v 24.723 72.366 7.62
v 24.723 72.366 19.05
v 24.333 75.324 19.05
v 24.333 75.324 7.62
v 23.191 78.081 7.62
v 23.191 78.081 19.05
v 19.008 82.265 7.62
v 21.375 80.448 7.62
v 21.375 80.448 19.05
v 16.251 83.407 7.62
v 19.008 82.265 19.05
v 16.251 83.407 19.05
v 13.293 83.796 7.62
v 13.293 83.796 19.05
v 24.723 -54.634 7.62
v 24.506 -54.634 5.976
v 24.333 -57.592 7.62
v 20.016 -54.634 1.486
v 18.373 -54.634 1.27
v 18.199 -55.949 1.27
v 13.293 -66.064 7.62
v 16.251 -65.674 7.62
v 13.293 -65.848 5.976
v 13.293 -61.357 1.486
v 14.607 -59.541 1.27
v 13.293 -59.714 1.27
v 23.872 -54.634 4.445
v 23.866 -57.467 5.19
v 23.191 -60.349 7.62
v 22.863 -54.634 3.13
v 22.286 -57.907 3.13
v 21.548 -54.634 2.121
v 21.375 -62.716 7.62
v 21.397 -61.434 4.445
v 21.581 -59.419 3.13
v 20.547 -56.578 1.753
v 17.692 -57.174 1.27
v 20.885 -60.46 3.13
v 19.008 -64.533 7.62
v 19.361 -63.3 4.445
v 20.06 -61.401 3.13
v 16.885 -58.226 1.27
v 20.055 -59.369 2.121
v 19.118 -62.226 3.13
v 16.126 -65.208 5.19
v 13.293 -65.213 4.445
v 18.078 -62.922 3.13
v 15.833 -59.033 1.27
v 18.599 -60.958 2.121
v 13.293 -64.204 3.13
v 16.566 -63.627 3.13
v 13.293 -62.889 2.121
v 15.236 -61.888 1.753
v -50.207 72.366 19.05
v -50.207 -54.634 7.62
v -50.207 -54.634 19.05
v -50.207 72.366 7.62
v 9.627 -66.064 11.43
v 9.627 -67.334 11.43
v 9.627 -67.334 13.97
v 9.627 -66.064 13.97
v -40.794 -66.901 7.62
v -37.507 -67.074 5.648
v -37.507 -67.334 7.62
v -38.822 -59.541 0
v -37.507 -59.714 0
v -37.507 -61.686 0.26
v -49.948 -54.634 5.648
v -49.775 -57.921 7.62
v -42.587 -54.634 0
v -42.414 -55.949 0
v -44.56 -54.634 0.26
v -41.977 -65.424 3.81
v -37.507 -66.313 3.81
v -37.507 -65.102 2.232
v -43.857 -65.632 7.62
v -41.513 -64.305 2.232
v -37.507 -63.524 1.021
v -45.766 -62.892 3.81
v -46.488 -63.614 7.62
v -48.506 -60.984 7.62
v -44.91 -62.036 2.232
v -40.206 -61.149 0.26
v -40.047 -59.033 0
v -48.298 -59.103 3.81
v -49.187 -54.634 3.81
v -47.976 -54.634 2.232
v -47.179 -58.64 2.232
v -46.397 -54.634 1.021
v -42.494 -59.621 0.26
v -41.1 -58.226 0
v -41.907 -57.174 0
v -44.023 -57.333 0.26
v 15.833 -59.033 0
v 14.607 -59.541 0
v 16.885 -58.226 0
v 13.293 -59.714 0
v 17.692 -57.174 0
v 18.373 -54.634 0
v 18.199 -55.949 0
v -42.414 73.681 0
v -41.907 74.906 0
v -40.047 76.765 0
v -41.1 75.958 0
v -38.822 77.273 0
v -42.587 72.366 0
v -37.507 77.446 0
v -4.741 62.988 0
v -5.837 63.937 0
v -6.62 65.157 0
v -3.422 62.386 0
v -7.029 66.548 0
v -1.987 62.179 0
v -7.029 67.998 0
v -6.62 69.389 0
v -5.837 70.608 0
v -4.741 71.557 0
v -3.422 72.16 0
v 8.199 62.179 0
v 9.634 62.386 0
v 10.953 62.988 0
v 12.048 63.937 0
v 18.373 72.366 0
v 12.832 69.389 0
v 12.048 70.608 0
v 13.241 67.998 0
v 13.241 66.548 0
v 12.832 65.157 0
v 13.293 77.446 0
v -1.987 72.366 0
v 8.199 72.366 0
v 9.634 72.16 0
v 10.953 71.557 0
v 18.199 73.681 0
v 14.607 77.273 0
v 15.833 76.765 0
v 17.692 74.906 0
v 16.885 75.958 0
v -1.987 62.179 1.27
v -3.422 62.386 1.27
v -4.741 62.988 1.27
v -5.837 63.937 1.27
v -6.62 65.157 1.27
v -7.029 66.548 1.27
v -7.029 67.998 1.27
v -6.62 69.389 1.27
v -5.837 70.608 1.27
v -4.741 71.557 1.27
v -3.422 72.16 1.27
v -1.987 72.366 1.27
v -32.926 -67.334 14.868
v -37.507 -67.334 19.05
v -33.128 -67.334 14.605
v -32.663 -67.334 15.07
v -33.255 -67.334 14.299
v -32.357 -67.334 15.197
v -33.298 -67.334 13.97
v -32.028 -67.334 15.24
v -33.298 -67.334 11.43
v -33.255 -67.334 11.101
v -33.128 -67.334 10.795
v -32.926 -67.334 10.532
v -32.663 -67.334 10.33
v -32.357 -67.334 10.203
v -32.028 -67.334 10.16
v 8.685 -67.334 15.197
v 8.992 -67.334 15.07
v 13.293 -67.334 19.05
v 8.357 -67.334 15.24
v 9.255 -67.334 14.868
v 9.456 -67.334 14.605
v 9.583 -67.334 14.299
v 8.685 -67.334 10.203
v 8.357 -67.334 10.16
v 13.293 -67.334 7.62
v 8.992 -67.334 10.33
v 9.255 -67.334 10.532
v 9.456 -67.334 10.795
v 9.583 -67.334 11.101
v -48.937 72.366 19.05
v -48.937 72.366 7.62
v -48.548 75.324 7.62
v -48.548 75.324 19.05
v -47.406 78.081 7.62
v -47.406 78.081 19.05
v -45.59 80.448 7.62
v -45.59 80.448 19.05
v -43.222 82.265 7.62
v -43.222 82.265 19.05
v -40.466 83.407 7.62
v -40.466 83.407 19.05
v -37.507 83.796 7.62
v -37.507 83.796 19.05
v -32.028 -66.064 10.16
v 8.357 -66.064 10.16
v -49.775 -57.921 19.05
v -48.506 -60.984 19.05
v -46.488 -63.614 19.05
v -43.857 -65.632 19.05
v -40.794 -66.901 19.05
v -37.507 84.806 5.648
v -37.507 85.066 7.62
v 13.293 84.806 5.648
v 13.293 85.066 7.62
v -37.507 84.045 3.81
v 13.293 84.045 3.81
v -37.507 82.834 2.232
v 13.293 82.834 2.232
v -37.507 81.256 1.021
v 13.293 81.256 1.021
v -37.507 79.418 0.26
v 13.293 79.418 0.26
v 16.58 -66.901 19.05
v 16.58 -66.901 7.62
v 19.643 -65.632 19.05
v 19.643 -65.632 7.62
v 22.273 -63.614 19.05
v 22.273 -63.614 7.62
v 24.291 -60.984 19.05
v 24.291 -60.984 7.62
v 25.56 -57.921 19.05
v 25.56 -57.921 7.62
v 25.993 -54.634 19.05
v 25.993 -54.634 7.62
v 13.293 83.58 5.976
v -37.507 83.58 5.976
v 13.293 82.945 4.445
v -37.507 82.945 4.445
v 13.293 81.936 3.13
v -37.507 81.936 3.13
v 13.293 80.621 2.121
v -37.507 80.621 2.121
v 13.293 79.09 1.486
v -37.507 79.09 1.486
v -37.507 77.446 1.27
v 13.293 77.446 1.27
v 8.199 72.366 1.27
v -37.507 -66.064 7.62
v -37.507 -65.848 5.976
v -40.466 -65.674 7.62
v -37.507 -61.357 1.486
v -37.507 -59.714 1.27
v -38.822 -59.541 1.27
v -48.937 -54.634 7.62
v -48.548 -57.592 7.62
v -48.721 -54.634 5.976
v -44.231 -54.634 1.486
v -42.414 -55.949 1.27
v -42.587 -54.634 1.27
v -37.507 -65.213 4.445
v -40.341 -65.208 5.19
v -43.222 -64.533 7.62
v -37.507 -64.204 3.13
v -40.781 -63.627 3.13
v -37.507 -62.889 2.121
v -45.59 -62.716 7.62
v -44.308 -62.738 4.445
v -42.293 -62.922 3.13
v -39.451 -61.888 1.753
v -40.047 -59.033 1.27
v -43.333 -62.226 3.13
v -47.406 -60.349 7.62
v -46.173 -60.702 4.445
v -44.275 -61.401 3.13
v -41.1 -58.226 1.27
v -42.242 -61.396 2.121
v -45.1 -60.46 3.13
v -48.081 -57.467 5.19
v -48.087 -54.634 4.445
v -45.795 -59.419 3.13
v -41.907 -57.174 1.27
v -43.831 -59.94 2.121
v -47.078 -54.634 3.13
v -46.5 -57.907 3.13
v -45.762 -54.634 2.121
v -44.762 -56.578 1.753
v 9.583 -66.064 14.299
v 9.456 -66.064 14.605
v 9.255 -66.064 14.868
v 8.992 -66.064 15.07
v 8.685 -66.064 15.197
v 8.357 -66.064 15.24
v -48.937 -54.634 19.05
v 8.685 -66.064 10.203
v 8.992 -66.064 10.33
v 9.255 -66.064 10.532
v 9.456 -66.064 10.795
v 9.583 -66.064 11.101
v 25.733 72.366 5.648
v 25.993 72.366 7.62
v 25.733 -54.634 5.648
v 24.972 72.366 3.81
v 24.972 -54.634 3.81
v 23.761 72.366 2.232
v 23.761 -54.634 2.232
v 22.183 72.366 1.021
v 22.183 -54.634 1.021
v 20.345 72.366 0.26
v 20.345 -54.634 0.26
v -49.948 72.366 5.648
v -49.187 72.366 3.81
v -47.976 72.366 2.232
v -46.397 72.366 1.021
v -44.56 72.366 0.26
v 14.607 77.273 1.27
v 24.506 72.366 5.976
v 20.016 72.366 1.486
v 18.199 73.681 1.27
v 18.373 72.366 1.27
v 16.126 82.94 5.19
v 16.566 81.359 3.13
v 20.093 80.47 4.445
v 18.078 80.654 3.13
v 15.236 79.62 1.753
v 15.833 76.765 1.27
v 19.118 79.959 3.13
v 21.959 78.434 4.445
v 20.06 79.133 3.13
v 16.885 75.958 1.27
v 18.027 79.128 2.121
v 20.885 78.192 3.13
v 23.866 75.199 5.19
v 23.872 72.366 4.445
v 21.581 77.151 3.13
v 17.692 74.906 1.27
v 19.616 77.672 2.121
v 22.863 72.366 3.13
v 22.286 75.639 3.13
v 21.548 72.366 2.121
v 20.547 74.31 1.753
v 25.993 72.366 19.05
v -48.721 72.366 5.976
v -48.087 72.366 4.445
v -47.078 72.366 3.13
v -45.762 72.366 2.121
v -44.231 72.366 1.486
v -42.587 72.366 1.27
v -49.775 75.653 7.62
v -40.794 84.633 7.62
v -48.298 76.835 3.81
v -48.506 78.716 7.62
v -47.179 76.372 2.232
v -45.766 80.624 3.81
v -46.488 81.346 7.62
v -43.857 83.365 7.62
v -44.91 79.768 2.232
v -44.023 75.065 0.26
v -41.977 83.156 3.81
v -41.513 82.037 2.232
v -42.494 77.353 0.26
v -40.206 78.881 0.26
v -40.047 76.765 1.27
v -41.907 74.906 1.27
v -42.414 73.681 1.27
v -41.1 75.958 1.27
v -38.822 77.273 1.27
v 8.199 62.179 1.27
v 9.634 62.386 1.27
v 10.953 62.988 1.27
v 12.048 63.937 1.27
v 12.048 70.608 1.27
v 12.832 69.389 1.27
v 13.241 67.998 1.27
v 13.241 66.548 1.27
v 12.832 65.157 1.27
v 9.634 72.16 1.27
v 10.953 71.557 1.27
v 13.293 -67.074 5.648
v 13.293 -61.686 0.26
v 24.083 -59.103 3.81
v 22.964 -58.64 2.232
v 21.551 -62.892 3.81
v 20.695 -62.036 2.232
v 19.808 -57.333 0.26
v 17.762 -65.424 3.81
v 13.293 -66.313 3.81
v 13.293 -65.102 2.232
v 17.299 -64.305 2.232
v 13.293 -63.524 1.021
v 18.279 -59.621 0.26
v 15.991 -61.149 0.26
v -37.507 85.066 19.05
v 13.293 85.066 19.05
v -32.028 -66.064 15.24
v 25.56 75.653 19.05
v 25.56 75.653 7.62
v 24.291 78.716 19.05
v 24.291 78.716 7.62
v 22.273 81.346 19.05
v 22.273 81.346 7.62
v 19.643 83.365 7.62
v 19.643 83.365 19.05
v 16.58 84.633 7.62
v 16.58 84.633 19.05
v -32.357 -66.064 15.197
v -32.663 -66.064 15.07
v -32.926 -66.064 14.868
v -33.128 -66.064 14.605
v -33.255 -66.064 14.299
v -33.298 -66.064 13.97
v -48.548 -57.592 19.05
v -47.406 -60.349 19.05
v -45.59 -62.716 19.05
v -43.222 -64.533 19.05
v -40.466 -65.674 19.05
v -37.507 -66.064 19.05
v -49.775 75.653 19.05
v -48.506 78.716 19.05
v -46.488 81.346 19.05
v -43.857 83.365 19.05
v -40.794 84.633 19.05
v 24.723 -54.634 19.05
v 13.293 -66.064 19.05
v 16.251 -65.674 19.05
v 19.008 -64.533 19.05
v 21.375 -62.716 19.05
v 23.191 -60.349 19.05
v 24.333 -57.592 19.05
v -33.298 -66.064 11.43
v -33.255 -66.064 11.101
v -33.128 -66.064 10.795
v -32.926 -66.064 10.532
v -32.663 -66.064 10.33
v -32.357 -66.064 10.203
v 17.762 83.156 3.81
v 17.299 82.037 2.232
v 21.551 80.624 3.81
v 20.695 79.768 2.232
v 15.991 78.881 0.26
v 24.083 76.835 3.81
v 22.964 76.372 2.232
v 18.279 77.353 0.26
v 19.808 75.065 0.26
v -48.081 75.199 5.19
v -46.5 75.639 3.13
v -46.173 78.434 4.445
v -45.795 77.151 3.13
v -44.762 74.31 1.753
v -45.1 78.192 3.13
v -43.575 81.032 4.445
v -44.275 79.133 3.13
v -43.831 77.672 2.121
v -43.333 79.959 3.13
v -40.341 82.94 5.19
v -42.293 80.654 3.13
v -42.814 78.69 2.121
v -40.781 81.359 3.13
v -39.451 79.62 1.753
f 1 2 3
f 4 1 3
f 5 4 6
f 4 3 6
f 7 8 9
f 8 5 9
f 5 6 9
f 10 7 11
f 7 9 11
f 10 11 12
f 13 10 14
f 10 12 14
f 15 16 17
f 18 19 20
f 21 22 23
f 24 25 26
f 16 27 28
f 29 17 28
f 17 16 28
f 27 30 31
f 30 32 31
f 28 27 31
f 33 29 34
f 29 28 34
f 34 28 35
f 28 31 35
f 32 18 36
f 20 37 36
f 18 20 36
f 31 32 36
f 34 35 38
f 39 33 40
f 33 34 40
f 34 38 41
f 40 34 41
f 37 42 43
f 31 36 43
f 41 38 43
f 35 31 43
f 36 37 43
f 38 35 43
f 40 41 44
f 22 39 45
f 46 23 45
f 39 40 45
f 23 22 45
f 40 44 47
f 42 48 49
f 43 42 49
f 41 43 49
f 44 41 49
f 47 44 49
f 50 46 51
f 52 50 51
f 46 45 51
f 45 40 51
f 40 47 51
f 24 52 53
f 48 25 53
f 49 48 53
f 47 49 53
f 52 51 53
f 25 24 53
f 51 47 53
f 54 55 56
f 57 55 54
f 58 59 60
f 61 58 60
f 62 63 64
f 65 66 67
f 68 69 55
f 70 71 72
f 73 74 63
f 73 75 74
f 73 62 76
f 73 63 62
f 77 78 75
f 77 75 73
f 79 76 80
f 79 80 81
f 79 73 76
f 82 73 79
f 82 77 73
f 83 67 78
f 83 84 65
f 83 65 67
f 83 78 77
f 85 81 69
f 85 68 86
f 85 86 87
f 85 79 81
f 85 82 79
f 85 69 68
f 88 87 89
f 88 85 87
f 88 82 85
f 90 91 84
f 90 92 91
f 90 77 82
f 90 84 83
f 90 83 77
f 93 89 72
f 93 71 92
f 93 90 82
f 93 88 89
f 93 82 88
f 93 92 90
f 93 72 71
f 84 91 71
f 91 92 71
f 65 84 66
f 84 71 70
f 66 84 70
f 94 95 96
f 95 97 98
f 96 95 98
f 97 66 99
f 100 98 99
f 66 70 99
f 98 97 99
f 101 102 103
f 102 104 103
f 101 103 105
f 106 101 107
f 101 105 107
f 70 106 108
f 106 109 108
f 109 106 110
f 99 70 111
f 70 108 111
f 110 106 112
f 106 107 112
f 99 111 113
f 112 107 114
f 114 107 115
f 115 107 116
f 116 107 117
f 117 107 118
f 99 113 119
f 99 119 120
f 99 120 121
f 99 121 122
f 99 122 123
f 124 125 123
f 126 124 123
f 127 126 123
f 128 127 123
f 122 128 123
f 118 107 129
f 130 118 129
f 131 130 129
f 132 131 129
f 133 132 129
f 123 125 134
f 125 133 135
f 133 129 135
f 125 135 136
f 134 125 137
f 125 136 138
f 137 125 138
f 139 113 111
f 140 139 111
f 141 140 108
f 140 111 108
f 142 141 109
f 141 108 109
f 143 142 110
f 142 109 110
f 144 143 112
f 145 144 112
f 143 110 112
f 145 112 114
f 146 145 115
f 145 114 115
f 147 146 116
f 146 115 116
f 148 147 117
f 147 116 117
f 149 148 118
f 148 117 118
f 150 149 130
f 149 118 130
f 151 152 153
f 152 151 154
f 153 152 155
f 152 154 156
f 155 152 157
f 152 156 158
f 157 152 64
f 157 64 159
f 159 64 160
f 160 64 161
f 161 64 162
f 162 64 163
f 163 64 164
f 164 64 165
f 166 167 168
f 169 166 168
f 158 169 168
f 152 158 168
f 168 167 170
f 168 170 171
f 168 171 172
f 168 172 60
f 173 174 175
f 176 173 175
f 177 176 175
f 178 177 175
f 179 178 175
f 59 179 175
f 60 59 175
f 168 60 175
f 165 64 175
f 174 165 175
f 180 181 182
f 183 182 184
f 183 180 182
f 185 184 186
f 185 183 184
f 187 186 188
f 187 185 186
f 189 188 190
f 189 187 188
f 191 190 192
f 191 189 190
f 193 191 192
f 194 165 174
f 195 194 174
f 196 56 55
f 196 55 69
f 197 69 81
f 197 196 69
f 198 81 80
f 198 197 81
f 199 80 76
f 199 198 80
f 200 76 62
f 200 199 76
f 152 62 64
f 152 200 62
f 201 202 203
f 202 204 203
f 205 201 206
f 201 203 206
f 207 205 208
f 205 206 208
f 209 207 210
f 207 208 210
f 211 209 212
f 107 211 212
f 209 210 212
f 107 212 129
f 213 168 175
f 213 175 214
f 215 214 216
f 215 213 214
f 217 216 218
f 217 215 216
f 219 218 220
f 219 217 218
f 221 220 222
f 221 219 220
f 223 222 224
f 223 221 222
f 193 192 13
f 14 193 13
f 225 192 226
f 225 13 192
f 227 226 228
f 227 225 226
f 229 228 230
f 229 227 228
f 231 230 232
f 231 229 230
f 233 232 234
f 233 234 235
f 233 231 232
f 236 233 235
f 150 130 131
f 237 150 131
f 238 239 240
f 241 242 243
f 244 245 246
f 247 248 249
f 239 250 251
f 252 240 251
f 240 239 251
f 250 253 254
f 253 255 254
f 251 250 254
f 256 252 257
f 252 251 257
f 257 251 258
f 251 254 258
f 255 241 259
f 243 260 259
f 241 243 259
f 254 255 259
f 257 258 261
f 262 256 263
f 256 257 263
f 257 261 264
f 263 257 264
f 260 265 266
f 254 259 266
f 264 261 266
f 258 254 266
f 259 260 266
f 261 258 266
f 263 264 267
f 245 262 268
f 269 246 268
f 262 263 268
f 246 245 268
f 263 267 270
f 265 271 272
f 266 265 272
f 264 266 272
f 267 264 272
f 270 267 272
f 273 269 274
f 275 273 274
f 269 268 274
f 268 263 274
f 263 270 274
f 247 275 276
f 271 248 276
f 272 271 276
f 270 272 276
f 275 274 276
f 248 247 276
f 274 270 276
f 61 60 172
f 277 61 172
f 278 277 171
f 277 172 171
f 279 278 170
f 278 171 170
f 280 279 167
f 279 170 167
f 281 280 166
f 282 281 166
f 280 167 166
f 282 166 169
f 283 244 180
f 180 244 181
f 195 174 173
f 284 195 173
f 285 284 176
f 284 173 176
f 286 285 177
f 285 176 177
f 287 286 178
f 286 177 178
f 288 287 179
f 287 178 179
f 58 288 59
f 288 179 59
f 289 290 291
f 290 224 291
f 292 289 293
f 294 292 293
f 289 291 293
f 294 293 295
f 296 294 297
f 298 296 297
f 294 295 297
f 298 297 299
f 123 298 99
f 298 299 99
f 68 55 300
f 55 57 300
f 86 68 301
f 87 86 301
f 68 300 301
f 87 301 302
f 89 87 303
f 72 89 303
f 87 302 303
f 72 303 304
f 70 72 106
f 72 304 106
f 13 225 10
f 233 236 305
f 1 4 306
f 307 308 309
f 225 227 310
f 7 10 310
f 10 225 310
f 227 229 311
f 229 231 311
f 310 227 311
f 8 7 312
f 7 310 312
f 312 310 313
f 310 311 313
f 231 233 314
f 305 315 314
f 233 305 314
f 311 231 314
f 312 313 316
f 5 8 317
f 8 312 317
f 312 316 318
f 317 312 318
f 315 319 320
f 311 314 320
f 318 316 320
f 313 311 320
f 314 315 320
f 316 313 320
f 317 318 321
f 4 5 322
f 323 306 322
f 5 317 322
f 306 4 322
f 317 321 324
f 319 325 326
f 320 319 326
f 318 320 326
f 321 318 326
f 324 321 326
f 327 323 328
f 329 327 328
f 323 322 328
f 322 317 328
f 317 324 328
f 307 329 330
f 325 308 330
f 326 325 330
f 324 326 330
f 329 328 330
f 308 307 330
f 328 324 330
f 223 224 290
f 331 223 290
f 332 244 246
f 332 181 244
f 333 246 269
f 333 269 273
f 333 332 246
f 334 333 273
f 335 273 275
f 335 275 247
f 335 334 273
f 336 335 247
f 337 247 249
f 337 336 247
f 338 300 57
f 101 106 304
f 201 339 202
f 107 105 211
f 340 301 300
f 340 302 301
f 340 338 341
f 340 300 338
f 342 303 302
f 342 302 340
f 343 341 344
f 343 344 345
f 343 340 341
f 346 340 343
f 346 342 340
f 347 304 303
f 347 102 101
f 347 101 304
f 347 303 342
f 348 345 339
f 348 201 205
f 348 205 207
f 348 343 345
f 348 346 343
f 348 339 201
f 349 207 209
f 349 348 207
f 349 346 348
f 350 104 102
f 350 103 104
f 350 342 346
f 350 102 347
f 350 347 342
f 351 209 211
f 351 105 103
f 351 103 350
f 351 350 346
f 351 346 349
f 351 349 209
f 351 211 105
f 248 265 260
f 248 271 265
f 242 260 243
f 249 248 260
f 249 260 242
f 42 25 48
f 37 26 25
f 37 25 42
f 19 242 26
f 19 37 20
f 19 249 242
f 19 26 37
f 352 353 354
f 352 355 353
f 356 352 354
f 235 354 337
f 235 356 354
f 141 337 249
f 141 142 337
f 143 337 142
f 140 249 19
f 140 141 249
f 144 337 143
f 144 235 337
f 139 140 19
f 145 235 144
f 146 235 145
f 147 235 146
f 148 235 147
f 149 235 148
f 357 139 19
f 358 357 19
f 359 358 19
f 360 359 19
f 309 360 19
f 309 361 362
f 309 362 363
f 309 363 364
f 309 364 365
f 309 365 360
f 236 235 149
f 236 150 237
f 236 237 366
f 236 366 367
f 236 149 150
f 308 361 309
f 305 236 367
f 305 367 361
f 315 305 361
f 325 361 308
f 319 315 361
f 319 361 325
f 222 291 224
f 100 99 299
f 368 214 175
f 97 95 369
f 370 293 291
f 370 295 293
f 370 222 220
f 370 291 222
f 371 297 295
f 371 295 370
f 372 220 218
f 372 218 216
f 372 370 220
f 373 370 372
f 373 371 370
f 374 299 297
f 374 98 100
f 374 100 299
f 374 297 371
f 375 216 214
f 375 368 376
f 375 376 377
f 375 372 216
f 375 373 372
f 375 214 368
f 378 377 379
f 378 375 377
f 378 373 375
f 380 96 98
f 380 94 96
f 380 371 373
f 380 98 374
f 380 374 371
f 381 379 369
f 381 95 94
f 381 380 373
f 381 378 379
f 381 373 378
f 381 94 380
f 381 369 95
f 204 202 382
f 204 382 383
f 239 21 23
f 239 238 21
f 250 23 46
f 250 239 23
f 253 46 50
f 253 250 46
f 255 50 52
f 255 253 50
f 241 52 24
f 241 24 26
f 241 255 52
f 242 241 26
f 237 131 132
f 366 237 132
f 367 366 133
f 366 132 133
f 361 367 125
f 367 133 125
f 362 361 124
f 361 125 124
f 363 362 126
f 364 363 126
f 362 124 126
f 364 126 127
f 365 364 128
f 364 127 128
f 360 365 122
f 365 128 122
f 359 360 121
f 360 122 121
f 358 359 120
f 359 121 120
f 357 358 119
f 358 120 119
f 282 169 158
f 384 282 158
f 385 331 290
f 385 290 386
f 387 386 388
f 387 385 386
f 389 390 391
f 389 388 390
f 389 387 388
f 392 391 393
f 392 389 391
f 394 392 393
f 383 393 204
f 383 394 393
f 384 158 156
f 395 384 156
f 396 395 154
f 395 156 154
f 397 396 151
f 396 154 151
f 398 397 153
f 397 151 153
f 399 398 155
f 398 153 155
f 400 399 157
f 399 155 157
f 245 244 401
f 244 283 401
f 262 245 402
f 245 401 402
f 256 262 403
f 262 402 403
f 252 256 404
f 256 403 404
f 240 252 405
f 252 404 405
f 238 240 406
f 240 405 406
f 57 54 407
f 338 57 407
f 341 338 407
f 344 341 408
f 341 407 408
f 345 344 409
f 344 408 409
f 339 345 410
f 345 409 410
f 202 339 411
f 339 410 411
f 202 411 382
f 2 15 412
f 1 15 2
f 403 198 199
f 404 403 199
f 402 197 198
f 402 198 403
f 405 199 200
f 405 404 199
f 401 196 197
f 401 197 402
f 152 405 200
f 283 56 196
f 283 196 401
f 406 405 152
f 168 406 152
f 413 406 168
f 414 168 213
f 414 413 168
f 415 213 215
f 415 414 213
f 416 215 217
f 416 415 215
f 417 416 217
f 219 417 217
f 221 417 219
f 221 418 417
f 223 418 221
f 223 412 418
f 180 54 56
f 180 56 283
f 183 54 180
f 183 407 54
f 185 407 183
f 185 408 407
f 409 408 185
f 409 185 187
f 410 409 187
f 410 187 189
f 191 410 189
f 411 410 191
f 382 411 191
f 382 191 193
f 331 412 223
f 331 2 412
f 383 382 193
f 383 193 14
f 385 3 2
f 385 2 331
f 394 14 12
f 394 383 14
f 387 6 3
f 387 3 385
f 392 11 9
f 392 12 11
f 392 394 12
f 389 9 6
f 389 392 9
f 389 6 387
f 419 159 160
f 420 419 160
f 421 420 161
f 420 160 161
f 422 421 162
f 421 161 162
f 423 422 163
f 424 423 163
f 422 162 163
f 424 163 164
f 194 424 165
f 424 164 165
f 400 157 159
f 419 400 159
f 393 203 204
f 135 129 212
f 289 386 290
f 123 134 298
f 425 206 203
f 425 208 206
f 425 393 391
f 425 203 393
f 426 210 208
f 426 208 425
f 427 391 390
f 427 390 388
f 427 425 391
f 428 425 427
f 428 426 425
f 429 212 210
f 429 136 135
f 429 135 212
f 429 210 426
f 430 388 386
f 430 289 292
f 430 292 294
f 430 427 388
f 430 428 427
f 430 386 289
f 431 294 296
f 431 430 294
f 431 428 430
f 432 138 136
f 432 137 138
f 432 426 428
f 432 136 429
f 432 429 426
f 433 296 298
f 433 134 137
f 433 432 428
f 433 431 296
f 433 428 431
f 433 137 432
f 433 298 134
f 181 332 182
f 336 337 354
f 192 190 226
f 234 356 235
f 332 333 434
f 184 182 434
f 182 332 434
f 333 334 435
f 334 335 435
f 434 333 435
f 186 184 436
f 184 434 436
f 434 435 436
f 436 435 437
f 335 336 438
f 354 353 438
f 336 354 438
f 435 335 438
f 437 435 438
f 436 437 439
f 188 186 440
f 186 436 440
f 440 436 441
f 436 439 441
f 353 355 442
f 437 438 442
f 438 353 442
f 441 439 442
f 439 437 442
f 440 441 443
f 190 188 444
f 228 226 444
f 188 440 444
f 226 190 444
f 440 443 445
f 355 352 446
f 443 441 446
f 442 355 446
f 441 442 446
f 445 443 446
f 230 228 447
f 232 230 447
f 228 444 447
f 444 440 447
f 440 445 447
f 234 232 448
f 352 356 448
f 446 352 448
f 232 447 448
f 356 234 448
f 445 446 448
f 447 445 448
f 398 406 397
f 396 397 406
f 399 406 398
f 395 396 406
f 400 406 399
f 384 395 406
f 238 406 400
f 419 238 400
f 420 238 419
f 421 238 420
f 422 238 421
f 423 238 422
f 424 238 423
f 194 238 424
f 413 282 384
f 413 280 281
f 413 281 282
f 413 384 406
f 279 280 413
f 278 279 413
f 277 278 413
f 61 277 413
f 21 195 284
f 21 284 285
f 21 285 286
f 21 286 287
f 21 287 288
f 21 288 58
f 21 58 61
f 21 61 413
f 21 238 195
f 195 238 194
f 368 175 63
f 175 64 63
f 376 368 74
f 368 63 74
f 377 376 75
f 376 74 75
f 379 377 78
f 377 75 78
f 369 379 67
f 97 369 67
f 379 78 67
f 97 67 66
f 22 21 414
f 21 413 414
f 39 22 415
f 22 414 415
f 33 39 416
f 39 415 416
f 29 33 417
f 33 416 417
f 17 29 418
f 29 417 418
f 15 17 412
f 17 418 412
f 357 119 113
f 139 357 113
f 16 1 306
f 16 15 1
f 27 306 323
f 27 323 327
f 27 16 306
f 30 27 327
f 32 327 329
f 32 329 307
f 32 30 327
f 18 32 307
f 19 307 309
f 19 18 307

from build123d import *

# Parameters (mm, degrees)
F0_W     = 76.2
F0_H     = 152.4
F1_DEPTH = 19.05
F2_R     = 12.7
F3_R     = 7.62
F4_T     = -1.27
F6_DEPTH = 25.4
F8_DEPTH = 25.4


with BuildPart() as f1:
    # F0 (on Top) → F1 (new body)
    with BuildSketch(Plane.XY):
        with Locations((-12.107471, 8.866039)):
            Rectangle(F0_W, F0_H)
    extrude(amount=F1_DEPTH)

    # F2
    f2_edges = [f1.edges().sort_by_distance(p)[0] for p in [
        (25.992529, 85.066039, 9.525),
        (25.992529, -67.333961, 9.525),
        (-50.207471, 85.066039, 9.525),
        (-50.207471, -67.333961, 9.525),
    ]]
    fillet(f2_edges, radius=F2_R)

    # F3
    f3_edges = [f1.edges().sort_by_distance(p)[0] for p in [
        (-50.207471, 8.866039, 0),
        (-46.487727, 81.346295, 0),
        (-46.487727, -63.614217, 0),
        (-12.107471, 85.066039, 0),
        (-12.107471, -67.333961, 0),
        (22.272785, 81.346295, 0),
        (22.272785, -63.614217, 0),
        (25.992529, 8.866039, 0),
    ]]
    fillet(f3_edges, radius=F3_R)

    # F4
    f4_openings = [f1.faces().sort_by_distance(p)[0] for p in [
        (-12.107471, 8.866039, 19.05),
    ]]
    offset(amount=F4_T, openings=f4_openings)

    # F5 (on face) → F6 (cut)
    with BuildSketch(Plane(origin=(0, 0, 0), x_dir=(1, 0, 0), z_dir=(0, 0, -1))):
        with BuildLine():
            Line((-1.987378, -72.366039), (8.199227, -72.366039))
            ThreePointArc((8.199227, -72.366039), (13.292529, -67.272736), (8.199227, -62.179434))
            Line((8.199227, -62.179434), (-1.987378, -62.179434))
            ThreePointArc((-1.987378, -62.179434), (-7.08068, -67.272736), (-1.987378, -72.366039))
        make_face()
    extrude(amount=-F6_DEPTH, mode=Mode.SUBTRACT)

    # F7 (on face) → F8 (cut)
    with BuildSketch(Plane.XZ.offset(67.333961)):
        with BuildLine():
            Line((8.356589, 15.24), (-32.028437, 15.24))
            ThreePointArc((-32.028437, 15.24), (-32.926462, 14.868026), (-33.298437, 13.97))
            Line((-33.298437, 13.97), (-33.298437, 11.43))
            ThreePointArc((-33.298437, 11.43), (-32.926462, 10.531974), (-32.028437, 10.16))
            Line((-32.028437, 10.16), (8.356589, 10.16))
            ThreePointArc((8.356589, 10.16), (9.254614, 10.531974), (9.626589, 11.43))
            Line((9.626589, 11.43), (9.626589, 13.97))
            ThreePointArc((9.626589, 13.97), (9.254614, 14.868026), (8.356589, 15.24))
        make_face()
    extrude(amount=-F8_DEPTH, mode=Mode.SUBTRACT)


solid = f1.part
